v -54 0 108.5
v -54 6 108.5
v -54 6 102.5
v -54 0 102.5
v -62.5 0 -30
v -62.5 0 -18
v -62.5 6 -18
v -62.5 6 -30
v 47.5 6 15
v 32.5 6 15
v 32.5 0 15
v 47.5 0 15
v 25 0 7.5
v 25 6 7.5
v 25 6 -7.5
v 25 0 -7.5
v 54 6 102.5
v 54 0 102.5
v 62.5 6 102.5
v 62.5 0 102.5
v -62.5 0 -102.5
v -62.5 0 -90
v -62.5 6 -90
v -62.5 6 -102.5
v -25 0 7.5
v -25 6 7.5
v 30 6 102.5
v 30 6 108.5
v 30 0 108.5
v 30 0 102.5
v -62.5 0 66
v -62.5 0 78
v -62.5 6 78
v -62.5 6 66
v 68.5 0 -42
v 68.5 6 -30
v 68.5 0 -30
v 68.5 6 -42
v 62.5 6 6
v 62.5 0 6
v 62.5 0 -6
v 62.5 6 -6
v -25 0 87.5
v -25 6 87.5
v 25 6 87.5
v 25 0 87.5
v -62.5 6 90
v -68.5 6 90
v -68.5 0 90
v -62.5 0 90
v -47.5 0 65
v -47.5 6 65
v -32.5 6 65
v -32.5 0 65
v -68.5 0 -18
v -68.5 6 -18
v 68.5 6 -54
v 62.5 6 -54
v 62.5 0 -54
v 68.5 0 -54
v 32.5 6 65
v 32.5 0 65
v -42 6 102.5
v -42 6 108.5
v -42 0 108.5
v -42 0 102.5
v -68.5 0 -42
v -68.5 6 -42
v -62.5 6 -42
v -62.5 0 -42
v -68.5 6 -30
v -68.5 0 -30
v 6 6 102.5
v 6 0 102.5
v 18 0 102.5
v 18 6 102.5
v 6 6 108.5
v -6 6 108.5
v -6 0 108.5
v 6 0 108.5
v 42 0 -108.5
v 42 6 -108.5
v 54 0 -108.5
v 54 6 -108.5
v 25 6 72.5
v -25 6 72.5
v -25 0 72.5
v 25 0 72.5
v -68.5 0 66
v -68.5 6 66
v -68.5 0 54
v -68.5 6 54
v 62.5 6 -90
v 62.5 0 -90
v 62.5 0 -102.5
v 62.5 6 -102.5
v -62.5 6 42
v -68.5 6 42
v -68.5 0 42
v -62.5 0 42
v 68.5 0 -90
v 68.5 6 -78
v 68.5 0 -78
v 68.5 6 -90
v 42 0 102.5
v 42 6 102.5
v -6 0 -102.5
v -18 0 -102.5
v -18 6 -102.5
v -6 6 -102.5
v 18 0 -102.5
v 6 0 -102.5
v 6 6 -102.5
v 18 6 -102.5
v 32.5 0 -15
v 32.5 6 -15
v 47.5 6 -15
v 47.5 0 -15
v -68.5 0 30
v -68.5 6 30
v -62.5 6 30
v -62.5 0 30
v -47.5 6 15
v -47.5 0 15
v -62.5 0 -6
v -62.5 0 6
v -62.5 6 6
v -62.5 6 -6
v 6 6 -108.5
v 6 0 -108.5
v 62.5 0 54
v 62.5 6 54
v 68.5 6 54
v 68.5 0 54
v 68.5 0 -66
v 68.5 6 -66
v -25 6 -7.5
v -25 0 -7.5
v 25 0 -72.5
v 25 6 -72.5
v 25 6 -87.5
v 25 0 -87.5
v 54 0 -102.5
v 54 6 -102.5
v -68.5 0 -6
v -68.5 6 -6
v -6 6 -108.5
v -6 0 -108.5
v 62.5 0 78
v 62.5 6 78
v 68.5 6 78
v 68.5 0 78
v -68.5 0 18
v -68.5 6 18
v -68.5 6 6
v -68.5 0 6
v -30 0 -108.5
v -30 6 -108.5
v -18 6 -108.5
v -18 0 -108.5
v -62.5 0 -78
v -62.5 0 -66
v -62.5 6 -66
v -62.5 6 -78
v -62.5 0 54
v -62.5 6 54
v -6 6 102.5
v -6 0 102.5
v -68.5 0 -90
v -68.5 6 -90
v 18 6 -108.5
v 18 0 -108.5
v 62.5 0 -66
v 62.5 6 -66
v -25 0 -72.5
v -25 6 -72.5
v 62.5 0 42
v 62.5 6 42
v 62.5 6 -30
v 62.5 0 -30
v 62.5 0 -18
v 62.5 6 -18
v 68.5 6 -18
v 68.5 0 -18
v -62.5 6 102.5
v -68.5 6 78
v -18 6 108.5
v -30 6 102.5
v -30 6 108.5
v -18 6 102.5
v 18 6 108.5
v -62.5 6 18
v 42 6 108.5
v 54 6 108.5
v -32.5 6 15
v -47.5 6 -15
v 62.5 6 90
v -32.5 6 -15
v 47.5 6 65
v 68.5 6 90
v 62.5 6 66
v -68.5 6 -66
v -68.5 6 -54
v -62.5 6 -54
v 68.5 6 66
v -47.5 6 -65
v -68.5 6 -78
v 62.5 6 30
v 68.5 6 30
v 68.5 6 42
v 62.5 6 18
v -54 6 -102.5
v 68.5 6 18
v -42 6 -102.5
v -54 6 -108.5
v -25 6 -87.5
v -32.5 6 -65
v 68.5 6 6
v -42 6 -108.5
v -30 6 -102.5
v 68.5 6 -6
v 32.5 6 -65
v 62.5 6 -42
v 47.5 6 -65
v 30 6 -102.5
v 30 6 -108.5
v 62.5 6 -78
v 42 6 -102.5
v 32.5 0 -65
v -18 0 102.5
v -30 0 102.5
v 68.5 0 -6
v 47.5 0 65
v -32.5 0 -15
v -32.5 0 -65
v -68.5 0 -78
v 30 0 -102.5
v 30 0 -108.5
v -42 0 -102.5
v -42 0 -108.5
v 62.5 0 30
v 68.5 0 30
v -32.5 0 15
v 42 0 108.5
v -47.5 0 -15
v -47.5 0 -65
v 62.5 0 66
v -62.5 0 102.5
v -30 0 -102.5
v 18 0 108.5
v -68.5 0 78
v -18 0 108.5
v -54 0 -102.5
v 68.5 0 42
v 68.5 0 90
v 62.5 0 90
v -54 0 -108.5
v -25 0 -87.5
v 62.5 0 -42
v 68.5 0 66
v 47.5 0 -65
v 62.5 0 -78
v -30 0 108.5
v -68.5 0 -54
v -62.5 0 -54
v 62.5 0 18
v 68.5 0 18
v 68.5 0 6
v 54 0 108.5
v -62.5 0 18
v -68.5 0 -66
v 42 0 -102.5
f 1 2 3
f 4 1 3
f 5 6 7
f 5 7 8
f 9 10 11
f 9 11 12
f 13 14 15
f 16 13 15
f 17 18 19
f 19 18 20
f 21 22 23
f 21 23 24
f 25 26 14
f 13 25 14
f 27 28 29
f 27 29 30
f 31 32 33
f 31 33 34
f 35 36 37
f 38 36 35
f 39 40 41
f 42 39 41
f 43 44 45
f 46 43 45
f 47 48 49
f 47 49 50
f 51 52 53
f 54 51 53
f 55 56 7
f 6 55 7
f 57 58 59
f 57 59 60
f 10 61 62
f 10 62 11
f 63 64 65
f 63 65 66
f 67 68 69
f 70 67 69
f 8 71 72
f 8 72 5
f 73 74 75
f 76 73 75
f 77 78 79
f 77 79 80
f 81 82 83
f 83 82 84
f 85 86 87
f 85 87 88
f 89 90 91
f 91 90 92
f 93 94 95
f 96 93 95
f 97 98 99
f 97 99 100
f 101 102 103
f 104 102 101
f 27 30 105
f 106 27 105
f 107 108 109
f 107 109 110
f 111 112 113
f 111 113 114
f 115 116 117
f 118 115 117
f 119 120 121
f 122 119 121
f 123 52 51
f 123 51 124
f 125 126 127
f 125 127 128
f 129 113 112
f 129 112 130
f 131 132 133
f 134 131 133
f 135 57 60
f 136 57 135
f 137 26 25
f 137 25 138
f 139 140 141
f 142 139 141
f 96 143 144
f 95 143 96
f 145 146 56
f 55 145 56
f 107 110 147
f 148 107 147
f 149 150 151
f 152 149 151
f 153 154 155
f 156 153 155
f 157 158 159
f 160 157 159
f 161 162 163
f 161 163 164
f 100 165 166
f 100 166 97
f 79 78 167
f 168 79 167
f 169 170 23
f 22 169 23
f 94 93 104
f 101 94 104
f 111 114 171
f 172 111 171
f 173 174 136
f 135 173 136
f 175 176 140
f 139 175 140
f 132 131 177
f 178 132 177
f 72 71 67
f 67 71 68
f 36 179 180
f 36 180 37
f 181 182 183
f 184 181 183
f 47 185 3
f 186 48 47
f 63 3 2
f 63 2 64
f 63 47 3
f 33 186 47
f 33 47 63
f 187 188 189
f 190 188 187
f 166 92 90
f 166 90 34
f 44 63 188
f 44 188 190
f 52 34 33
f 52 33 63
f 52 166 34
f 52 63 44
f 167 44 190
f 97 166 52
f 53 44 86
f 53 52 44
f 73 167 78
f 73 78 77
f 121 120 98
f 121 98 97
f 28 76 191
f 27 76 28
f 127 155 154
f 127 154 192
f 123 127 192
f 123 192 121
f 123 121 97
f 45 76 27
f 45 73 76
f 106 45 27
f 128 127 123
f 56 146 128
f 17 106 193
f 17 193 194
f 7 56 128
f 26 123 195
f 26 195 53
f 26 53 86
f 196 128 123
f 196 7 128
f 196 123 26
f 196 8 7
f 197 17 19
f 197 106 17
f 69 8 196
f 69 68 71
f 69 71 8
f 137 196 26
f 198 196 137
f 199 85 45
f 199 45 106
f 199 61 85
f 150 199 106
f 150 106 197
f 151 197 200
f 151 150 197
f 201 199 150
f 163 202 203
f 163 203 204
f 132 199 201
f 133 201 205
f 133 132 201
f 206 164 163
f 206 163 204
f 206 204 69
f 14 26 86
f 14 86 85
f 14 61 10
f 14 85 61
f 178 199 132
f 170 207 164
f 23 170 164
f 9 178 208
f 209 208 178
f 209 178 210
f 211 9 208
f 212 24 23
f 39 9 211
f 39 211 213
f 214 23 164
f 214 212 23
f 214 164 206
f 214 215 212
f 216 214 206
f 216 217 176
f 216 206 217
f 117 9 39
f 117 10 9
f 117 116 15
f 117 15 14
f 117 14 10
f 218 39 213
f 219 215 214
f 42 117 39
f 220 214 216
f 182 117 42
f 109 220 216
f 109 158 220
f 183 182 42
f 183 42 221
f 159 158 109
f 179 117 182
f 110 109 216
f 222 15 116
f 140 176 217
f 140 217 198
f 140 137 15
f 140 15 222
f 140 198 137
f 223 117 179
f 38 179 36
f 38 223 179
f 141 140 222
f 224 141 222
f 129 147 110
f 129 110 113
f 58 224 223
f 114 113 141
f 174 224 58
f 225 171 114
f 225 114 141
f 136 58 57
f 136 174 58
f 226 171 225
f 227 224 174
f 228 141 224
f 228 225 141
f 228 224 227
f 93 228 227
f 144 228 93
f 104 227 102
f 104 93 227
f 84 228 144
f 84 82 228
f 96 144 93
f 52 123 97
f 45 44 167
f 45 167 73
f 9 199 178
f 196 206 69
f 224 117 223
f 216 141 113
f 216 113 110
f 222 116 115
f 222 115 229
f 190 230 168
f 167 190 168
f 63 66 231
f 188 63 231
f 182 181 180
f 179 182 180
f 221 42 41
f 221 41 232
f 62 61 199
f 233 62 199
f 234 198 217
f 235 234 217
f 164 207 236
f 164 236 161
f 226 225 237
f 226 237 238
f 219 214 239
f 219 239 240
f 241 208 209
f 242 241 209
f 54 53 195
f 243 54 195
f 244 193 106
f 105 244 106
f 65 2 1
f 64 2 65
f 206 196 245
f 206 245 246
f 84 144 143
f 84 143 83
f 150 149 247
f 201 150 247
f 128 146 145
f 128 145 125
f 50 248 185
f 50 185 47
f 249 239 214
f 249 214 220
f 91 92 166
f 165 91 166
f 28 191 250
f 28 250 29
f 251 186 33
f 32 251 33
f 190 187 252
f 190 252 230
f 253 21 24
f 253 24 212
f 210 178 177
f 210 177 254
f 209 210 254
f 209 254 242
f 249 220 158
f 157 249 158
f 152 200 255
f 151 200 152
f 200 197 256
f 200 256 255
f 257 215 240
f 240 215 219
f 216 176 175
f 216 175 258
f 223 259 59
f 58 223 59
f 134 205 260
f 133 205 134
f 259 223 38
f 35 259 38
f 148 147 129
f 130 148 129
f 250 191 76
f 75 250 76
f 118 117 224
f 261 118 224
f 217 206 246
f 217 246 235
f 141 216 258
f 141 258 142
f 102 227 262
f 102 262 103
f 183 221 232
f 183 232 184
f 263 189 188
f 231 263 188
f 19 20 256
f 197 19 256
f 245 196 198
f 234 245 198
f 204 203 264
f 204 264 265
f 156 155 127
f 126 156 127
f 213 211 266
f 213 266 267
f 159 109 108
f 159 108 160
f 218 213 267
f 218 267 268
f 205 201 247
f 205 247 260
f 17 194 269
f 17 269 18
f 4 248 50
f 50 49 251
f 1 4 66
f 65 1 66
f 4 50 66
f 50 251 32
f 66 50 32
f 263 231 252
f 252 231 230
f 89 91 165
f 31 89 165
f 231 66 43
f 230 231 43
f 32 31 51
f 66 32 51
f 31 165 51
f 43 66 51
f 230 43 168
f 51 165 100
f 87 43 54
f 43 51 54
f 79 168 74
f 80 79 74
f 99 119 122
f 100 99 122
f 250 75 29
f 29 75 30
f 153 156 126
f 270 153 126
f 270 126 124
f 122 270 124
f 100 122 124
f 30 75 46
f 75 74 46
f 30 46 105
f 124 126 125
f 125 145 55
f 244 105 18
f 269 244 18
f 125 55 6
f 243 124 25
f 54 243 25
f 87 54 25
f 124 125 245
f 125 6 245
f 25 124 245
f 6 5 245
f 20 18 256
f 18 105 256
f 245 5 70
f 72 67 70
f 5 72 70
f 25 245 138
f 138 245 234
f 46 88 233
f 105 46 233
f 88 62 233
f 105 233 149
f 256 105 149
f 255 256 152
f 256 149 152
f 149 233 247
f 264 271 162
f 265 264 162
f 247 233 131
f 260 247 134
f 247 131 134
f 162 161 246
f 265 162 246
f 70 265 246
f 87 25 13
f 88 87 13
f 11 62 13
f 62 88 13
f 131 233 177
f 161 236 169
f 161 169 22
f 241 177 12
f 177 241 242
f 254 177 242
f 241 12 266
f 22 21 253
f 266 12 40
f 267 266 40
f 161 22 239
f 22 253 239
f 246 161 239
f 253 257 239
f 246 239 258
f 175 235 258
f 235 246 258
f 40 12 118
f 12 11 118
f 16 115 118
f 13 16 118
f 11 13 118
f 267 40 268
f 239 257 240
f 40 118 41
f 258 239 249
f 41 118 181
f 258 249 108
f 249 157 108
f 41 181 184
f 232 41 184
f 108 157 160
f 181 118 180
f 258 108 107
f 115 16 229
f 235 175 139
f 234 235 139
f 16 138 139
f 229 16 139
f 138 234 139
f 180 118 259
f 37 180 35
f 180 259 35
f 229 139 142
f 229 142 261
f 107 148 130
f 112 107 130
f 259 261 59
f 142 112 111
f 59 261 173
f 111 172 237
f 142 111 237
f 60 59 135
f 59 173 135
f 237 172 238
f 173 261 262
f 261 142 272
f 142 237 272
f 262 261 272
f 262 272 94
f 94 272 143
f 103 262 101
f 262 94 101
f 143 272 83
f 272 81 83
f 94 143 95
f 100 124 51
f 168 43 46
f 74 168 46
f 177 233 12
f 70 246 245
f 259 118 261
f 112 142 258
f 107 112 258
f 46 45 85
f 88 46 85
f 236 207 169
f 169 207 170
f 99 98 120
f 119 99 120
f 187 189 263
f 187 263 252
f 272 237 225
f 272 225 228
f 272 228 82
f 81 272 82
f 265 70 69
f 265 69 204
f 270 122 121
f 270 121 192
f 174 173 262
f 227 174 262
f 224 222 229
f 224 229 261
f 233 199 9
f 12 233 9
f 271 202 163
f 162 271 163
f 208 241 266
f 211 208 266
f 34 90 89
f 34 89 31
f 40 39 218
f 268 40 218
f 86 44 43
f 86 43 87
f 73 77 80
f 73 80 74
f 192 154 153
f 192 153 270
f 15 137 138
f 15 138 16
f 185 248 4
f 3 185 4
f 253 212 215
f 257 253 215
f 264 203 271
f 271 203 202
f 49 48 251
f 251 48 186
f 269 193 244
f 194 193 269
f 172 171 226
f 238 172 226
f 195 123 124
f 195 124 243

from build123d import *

# Parameters (mm, degrees)
SKETCH3_W           = 125
SKETCH3_H           = 205
BOSS_EXTRUDE1_DEPTH = 6
SKETCH4_W           = 15
SKETCH4_H           = 50
SKETCH4_W_2         = 50
SKETCH4_H_2         = 15
CUT_EXTRUDE1_DEPTH  = 6
SKETCH5_W           = 12
SKETCH5_H           = 6
SKETCH5_W_2         = 6
SKETCH5_H_2         = 12
BOSS_EXTRUDE2_DEPTH = 6


with BuildPart() as part:
    # Sketch3 → Boss-Extrude1 (new body)
    with BuildSketch(Plane(origin=(0, 0, 0), x_dir=(1, 0, 0), z_dir=(0, 1, 0))):
        Rectangle(SKETCH3_W, SKETCH3_H)
    extrude(amount=BOSS_EXTRUDE1_DEPTH)

    # Sketch4 → Cut-Extrude1 (cut)
    with BuildSketch(Plane(origin=(0, 6, 0), x_dir=(1, 0, 0), z_dir=(0, 1, 0))):
        with Locations((-40, 40)):
            Rectangle(SKETCH4_W, SKETCH4_H)
        with Locations((40, 40)):
            Rectangle(SKETCH4_W, SKETCH4_H)
        Rectangle(SKETCH4_W_2, SKETCH4_H_2)
        with Locations((-40, -40)):
            Rectangle(SKETCH4_W, SKETCH4_H)
        with Locations((40, -40)):
            Rectangle(SKETCH4_W, SKETCH4_H)
        with Locations((0, 80)):
            Rectangle(SKETCH4_W_2, SKETCH4_H_2)
        with Locations((0, -80)):
            Rectangle(SKETCH4_W_2, SKETCH4_H_2)
    extrude(amount=-CUT_EXTRUDE1_DEPTH, mode=Mode.SUBTRACT)

    # Sketch5 → Boss-Extrude2 (add)
    with BuildSketch(Plane(origin=(0, 6, 0), x_dir=(1, 0, 0), z_dir=(0, 1, 0))):
        with Locations((24, -105.5)):
            Rectangle(SKETCH5_W, SKETCH5_H)
        with Locations((0, -105.5)):
            Rectangle(SKETCH5_W, SKETCH5_H)
        with Locations((-65.5, -84)):
            Rectangle(SKETCH5_W_2, SKETCH5_H_2)
        with Locations((-65.5, -60)):
            Rectangle(SKETCH5_W_2, SKETCH5_H_2)
        with Locations((-65.5, -12)):
            Rectangle(SKETCH5_W_2, SKETCH5_H_2)
        with Locations((65.5, -84)):
            Rectangle(SKETCH5_W_2, SKETCH5_H_2)
        with Locations((65.5, -36)):
            Rectangle(SKETCH5_W_2, SKETCH5_H_2)
        with Locations((65.5, -12)):
            Rectangle(SKETCH5_W_2, SKETCH5_H_2)
        with Locations((65.5, 12)):
            Rectangle(SKETCH5_W_2, SKETCH5_H_2)
        with Locations((65.5, 36)):
            Rectangle(SKETCH5_W_2, SKETCH5_H_2)
        with Locations((65.5, 84)):
            Rectangle(SKETCH5_W_2, SKETCH5_H_2)
        with Locations((24, 105.5)):
            Rectangle(SKETCH5_W, SKETCH5_H)
        with Locations((0, 105.5)):
            Rectangle(SKETCH5_W, SKETCH5_H)
        with Locations((-24, 105.5)):
            Rectangle(SKETCH5_W, SKETCH5_H)
        with Locations((-48, 105.5)):
            Rectangle(SKETCH5_W, SKETCH5_H)
        with Locations((-65.5, 36)):
            Rectangle(SKETCH5_W_2, SKETCH5_H_2)
        with Locations((-65.5, 12)):
            Rectangle(SKETCH5_W_2, SKETCH5_H_2)
        with Locations((48, -105.5)):
            Rectangle(SKETCH5_W, SKETCH5_H)
        with Locations((-24, -105.5)):
            Rectangle(SKETCH5_W, SKETCH5_H)
        with Locations((-48, -105.5)):
            Rectangle(SKETCH5_W, SKETCH5_H)
        with Locations((-65.5, -36)):
            Rectangle(SKETCH5_W_2, SKETCH5_H_2)
        with Locations((65.5, -60)):
            Rectangle(SKETCH5_W_2, SKETCH5_H_2)
        with Locations((65.5, 60)):
            Rectangle(SKETCH5_W_2, SKETCH5_H_2)
        with Locations((48, 105.5)):
            Rectangle(SKETCH5_W, SKETCH5_H)
        with Locations((-65.5, 84)):
            Rectangle(SKETCH5_W_2, SKETCH5_H_2)
        with Locations((-65.5, 60)):
            Rectangle(SKETCH5_W_2, SKETCH5_H_2)
    extrude(amount=-BOSS_EXTRUDE2_DEPTH)


solid = part.part
